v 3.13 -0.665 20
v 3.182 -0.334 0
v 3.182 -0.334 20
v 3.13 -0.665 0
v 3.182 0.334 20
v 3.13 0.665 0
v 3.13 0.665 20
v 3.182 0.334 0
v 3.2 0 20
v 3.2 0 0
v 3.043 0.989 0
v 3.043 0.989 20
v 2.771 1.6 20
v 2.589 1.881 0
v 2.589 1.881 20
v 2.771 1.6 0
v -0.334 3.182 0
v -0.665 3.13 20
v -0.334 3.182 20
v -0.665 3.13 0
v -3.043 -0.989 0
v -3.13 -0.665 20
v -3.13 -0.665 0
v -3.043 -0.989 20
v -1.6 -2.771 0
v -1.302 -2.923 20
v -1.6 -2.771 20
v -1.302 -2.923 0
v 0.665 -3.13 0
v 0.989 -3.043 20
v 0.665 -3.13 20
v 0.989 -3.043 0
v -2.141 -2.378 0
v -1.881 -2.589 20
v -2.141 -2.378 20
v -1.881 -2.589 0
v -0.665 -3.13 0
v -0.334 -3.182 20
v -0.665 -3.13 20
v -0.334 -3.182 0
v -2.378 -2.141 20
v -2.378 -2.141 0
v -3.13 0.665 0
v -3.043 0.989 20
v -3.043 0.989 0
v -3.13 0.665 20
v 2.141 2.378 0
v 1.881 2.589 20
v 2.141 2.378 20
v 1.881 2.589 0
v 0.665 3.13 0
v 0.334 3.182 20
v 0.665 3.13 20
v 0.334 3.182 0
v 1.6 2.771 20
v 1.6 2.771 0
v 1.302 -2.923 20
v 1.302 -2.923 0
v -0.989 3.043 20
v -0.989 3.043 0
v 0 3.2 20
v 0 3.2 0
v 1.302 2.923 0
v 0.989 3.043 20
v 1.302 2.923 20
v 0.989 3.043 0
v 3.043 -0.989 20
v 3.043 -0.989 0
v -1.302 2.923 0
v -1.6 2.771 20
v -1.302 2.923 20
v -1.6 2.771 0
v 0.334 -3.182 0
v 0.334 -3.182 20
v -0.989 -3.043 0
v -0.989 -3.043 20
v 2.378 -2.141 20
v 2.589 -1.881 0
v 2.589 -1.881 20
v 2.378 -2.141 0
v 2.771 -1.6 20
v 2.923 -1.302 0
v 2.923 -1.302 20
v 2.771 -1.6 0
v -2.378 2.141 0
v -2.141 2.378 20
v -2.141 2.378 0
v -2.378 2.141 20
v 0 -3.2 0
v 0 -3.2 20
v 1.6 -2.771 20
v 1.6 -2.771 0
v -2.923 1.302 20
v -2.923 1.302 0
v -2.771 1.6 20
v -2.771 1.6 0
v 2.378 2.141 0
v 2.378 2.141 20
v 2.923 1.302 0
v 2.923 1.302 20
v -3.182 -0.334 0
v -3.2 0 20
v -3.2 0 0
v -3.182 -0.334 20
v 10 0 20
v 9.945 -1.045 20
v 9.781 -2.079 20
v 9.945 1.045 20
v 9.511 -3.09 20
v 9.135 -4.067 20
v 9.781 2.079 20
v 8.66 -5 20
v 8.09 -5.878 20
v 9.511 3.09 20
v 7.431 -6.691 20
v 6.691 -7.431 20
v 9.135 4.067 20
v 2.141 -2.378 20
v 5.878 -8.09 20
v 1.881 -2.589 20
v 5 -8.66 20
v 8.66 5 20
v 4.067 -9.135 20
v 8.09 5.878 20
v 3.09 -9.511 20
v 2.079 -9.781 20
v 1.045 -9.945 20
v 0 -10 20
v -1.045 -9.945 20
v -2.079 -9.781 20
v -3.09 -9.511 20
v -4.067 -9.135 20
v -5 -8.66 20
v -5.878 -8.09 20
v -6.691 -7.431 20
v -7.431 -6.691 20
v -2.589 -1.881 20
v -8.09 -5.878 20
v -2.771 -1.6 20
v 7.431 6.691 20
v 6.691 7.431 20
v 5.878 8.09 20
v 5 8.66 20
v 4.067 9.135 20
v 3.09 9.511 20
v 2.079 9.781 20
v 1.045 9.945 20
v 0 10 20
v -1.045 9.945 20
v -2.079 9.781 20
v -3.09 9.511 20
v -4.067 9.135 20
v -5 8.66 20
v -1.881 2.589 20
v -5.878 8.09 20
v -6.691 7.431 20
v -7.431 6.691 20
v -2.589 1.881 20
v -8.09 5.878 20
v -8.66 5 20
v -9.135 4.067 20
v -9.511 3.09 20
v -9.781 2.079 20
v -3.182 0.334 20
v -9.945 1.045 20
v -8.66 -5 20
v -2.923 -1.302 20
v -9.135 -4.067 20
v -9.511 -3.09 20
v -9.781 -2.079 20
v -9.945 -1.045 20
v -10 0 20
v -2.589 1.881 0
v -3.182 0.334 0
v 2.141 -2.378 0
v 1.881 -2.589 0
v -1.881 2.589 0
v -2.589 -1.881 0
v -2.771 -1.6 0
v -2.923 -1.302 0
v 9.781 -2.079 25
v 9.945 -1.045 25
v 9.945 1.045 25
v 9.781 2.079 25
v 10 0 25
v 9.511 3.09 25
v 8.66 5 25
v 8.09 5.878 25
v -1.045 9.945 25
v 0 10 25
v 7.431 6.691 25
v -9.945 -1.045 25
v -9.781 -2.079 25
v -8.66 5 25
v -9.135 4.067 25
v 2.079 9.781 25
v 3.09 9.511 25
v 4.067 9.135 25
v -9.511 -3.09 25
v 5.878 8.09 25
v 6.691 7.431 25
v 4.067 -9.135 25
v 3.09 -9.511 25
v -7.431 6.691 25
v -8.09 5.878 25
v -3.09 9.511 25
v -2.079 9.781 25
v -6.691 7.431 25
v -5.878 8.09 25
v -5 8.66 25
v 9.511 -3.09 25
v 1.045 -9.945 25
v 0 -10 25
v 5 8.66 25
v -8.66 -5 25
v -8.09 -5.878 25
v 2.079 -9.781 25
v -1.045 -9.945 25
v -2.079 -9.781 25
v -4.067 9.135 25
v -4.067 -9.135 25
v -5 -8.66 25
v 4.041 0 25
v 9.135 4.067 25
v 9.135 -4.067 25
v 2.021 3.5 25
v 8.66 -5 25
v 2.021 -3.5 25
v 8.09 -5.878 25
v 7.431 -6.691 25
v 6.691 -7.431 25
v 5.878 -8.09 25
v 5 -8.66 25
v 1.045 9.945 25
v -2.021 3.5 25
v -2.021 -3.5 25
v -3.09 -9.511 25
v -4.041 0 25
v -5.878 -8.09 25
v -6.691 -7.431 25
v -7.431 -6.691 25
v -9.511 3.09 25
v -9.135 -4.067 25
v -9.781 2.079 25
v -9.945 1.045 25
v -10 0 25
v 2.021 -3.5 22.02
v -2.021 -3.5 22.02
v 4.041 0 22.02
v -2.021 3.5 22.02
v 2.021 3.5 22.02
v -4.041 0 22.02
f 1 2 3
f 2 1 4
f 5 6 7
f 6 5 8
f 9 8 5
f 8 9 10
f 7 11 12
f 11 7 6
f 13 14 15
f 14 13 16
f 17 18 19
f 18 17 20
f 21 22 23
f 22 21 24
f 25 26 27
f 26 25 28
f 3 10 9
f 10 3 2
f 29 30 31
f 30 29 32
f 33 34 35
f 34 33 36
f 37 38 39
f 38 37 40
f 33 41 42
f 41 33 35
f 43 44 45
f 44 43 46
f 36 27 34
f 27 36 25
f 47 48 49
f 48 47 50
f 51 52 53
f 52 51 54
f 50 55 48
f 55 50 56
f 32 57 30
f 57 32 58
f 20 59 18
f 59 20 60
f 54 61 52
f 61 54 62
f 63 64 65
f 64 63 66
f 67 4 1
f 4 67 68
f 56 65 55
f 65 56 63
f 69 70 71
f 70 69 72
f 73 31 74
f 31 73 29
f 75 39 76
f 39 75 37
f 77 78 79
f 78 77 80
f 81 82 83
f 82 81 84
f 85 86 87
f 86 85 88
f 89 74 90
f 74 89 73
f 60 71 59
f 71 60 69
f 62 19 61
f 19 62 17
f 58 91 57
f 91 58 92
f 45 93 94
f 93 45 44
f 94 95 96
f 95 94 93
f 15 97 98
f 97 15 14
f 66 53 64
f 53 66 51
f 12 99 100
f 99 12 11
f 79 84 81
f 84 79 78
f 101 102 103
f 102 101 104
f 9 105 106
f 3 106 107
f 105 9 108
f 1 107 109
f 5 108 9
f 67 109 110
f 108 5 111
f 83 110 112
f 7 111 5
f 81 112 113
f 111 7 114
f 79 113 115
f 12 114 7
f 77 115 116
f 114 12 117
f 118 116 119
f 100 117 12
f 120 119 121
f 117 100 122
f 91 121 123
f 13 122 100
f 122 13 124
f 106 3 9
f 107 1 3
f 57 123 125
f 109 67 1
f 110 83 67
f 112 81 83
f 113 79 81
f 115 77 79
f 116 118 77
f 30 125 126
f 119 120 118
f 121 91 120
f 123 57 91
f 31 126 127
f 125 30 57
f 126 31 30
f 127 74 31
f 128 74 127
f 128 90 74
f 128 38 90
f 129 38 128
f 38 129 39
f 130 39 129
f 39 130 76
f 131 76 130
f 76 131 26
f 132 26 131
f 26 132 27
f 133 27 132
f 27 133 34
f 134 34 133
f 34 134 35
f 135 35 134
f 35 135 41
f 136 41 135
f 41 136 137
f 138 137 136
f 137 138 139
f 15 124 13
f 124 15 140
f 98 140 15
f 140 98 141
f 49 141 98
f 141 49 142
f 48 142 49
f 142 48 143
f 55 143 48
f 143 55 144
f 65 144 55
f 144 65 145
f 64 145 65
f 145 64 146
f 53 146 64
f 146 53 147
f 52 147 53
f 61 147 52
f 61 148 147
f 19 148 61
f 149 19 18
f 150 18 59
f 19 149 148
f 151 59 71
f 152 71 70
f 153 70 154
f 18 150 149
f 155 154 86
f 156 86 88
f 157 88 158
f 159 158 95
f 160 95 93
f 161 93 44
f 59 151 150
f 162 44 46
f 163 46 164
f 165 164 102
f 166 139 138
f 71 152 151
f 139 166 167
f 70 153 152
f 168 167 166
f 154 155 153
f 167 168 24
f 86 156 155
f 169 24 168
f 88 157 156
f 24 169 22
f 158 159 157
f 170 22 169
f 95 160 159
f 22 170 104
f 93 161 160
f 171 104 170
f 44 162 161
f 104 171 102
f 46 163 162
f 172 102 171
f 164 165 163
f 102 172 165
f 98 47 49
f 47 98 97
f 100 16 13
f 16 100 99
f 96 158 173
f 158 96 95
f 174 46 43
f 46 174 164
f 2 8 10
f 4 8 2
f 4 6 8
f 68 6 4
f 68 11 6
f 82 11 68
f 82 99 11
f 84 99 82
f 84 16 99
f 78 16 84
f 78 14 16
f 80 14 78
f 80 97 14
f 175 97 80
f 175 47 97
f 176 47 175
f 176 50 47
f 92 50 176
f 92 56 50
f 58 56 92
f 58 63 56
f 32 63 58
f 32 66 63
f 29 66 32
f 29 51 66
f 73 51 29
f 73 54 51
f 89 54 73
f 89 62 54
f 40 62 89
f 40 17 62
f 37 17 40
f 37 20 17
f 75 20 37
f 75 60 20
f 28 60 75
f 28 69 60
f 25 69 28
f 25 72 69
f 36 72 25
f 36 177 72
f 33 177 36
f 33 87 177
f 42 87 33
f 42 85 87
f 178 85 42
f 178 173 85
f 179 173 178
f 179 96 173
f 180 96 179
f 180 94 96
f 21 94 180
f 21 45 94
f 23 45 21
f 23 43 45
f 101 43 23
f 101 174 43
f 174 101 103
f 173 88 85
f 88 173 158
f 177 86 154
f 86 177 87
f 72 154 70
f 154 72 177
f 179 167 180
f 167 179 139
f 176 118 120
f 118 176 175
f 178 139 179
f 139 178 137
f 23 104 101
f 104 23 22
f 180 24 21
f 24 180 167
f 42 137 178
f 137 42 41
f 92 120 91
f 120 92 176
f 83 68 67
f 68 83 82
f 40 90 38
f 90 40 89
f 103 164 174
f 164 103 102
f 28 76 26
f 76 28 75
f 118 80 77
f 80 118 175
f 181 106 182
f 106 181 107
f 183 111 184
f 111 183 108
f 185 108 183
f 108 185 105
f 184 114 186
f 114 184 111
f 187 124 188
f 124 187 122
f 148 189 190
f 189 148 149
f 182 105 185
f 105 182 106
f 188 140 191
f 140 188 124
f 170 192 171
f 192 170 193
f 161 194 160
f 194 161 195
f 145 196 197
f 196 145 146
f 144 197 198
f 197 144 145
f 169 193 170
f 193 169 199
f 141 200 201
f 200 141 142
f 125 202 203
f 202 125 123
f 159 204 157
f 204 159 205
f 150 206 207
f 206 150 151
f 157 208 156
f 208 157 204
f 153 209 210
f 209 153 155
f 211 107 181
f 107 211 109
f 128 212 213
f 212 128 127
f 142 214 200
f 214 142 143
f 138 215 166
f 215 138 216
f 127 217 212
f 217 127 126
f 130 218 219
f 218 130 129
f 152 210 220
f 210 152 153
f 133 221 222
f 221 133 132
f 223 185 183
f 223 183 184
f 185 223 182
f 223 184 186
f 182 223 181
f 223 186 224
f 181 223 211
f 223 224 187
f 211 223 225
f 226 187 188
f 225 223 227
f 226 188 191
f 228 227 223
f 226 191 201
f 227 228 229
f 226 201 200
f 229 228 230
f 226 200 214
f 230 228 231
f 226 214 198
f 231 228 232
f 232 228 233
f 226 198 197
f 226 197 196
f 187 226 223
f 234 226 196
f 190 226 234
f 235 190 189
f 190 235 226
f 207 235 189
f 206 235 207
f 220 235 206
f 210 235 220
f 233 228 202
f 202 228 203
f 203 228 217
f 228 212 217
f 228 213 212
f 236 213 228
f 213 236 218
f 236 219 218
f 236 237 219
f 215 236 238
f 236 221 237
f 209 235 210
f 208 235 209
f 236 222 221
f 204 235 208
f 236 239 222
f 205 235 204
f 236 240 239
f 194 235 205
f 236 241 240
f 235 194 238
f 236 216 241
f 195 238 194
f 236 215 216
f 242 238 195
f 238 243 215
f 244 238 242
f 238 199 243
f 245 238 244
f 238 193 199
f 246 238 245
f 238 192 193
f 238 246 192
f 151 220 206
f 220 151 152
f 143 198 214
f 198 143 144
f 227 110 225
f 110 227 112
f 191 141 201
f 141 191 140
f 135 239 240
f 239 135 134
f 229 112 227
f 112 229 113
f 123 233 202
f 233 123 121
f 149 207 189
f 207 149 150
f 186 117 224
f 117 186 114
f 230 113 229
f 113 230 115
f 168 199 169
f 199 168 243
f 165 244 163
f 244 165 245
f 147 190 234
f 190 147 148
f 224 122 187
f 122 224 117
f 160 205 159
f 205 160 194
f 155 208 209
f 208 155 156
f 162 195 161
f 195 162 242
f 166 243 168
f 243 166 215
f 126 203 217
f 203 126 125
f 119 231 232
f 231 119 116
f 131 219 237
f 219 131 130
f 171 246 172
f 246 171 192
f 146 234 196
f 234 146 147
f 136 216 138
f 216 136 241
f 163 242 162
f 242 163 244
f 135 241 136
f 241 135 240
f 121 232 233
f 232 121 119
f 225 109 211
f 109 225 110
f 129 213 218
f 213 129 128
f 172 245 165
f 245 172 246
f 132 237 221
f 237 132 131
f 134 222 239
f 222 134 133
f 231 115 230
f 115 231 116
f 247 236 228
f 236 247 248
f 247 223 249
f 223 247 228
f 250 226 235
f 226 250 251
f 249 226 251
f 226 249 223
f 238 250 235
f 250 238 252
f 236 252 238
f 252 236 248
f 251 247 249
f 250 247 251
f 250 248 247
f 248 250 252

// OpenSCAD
// Thumb screw, smooth-shank representation.
$fn = 60;
eps = 0.02;
shaft_d = 6.4;
head_d = 20;
shaft_l = 20;
head_h = 5;
difference() {
    union() { cylinder(d = shaft_d, h = shaft_l); translate([0, 0, shaft_l]) cylinder(d = head_d, h = head_h); }
    translate([0, 0, shaft_l + head_h - 3 + eps]) cylinder(d = head_d * 0.35 / cos(30), h = 3 + eps, $fn = 6);
}
